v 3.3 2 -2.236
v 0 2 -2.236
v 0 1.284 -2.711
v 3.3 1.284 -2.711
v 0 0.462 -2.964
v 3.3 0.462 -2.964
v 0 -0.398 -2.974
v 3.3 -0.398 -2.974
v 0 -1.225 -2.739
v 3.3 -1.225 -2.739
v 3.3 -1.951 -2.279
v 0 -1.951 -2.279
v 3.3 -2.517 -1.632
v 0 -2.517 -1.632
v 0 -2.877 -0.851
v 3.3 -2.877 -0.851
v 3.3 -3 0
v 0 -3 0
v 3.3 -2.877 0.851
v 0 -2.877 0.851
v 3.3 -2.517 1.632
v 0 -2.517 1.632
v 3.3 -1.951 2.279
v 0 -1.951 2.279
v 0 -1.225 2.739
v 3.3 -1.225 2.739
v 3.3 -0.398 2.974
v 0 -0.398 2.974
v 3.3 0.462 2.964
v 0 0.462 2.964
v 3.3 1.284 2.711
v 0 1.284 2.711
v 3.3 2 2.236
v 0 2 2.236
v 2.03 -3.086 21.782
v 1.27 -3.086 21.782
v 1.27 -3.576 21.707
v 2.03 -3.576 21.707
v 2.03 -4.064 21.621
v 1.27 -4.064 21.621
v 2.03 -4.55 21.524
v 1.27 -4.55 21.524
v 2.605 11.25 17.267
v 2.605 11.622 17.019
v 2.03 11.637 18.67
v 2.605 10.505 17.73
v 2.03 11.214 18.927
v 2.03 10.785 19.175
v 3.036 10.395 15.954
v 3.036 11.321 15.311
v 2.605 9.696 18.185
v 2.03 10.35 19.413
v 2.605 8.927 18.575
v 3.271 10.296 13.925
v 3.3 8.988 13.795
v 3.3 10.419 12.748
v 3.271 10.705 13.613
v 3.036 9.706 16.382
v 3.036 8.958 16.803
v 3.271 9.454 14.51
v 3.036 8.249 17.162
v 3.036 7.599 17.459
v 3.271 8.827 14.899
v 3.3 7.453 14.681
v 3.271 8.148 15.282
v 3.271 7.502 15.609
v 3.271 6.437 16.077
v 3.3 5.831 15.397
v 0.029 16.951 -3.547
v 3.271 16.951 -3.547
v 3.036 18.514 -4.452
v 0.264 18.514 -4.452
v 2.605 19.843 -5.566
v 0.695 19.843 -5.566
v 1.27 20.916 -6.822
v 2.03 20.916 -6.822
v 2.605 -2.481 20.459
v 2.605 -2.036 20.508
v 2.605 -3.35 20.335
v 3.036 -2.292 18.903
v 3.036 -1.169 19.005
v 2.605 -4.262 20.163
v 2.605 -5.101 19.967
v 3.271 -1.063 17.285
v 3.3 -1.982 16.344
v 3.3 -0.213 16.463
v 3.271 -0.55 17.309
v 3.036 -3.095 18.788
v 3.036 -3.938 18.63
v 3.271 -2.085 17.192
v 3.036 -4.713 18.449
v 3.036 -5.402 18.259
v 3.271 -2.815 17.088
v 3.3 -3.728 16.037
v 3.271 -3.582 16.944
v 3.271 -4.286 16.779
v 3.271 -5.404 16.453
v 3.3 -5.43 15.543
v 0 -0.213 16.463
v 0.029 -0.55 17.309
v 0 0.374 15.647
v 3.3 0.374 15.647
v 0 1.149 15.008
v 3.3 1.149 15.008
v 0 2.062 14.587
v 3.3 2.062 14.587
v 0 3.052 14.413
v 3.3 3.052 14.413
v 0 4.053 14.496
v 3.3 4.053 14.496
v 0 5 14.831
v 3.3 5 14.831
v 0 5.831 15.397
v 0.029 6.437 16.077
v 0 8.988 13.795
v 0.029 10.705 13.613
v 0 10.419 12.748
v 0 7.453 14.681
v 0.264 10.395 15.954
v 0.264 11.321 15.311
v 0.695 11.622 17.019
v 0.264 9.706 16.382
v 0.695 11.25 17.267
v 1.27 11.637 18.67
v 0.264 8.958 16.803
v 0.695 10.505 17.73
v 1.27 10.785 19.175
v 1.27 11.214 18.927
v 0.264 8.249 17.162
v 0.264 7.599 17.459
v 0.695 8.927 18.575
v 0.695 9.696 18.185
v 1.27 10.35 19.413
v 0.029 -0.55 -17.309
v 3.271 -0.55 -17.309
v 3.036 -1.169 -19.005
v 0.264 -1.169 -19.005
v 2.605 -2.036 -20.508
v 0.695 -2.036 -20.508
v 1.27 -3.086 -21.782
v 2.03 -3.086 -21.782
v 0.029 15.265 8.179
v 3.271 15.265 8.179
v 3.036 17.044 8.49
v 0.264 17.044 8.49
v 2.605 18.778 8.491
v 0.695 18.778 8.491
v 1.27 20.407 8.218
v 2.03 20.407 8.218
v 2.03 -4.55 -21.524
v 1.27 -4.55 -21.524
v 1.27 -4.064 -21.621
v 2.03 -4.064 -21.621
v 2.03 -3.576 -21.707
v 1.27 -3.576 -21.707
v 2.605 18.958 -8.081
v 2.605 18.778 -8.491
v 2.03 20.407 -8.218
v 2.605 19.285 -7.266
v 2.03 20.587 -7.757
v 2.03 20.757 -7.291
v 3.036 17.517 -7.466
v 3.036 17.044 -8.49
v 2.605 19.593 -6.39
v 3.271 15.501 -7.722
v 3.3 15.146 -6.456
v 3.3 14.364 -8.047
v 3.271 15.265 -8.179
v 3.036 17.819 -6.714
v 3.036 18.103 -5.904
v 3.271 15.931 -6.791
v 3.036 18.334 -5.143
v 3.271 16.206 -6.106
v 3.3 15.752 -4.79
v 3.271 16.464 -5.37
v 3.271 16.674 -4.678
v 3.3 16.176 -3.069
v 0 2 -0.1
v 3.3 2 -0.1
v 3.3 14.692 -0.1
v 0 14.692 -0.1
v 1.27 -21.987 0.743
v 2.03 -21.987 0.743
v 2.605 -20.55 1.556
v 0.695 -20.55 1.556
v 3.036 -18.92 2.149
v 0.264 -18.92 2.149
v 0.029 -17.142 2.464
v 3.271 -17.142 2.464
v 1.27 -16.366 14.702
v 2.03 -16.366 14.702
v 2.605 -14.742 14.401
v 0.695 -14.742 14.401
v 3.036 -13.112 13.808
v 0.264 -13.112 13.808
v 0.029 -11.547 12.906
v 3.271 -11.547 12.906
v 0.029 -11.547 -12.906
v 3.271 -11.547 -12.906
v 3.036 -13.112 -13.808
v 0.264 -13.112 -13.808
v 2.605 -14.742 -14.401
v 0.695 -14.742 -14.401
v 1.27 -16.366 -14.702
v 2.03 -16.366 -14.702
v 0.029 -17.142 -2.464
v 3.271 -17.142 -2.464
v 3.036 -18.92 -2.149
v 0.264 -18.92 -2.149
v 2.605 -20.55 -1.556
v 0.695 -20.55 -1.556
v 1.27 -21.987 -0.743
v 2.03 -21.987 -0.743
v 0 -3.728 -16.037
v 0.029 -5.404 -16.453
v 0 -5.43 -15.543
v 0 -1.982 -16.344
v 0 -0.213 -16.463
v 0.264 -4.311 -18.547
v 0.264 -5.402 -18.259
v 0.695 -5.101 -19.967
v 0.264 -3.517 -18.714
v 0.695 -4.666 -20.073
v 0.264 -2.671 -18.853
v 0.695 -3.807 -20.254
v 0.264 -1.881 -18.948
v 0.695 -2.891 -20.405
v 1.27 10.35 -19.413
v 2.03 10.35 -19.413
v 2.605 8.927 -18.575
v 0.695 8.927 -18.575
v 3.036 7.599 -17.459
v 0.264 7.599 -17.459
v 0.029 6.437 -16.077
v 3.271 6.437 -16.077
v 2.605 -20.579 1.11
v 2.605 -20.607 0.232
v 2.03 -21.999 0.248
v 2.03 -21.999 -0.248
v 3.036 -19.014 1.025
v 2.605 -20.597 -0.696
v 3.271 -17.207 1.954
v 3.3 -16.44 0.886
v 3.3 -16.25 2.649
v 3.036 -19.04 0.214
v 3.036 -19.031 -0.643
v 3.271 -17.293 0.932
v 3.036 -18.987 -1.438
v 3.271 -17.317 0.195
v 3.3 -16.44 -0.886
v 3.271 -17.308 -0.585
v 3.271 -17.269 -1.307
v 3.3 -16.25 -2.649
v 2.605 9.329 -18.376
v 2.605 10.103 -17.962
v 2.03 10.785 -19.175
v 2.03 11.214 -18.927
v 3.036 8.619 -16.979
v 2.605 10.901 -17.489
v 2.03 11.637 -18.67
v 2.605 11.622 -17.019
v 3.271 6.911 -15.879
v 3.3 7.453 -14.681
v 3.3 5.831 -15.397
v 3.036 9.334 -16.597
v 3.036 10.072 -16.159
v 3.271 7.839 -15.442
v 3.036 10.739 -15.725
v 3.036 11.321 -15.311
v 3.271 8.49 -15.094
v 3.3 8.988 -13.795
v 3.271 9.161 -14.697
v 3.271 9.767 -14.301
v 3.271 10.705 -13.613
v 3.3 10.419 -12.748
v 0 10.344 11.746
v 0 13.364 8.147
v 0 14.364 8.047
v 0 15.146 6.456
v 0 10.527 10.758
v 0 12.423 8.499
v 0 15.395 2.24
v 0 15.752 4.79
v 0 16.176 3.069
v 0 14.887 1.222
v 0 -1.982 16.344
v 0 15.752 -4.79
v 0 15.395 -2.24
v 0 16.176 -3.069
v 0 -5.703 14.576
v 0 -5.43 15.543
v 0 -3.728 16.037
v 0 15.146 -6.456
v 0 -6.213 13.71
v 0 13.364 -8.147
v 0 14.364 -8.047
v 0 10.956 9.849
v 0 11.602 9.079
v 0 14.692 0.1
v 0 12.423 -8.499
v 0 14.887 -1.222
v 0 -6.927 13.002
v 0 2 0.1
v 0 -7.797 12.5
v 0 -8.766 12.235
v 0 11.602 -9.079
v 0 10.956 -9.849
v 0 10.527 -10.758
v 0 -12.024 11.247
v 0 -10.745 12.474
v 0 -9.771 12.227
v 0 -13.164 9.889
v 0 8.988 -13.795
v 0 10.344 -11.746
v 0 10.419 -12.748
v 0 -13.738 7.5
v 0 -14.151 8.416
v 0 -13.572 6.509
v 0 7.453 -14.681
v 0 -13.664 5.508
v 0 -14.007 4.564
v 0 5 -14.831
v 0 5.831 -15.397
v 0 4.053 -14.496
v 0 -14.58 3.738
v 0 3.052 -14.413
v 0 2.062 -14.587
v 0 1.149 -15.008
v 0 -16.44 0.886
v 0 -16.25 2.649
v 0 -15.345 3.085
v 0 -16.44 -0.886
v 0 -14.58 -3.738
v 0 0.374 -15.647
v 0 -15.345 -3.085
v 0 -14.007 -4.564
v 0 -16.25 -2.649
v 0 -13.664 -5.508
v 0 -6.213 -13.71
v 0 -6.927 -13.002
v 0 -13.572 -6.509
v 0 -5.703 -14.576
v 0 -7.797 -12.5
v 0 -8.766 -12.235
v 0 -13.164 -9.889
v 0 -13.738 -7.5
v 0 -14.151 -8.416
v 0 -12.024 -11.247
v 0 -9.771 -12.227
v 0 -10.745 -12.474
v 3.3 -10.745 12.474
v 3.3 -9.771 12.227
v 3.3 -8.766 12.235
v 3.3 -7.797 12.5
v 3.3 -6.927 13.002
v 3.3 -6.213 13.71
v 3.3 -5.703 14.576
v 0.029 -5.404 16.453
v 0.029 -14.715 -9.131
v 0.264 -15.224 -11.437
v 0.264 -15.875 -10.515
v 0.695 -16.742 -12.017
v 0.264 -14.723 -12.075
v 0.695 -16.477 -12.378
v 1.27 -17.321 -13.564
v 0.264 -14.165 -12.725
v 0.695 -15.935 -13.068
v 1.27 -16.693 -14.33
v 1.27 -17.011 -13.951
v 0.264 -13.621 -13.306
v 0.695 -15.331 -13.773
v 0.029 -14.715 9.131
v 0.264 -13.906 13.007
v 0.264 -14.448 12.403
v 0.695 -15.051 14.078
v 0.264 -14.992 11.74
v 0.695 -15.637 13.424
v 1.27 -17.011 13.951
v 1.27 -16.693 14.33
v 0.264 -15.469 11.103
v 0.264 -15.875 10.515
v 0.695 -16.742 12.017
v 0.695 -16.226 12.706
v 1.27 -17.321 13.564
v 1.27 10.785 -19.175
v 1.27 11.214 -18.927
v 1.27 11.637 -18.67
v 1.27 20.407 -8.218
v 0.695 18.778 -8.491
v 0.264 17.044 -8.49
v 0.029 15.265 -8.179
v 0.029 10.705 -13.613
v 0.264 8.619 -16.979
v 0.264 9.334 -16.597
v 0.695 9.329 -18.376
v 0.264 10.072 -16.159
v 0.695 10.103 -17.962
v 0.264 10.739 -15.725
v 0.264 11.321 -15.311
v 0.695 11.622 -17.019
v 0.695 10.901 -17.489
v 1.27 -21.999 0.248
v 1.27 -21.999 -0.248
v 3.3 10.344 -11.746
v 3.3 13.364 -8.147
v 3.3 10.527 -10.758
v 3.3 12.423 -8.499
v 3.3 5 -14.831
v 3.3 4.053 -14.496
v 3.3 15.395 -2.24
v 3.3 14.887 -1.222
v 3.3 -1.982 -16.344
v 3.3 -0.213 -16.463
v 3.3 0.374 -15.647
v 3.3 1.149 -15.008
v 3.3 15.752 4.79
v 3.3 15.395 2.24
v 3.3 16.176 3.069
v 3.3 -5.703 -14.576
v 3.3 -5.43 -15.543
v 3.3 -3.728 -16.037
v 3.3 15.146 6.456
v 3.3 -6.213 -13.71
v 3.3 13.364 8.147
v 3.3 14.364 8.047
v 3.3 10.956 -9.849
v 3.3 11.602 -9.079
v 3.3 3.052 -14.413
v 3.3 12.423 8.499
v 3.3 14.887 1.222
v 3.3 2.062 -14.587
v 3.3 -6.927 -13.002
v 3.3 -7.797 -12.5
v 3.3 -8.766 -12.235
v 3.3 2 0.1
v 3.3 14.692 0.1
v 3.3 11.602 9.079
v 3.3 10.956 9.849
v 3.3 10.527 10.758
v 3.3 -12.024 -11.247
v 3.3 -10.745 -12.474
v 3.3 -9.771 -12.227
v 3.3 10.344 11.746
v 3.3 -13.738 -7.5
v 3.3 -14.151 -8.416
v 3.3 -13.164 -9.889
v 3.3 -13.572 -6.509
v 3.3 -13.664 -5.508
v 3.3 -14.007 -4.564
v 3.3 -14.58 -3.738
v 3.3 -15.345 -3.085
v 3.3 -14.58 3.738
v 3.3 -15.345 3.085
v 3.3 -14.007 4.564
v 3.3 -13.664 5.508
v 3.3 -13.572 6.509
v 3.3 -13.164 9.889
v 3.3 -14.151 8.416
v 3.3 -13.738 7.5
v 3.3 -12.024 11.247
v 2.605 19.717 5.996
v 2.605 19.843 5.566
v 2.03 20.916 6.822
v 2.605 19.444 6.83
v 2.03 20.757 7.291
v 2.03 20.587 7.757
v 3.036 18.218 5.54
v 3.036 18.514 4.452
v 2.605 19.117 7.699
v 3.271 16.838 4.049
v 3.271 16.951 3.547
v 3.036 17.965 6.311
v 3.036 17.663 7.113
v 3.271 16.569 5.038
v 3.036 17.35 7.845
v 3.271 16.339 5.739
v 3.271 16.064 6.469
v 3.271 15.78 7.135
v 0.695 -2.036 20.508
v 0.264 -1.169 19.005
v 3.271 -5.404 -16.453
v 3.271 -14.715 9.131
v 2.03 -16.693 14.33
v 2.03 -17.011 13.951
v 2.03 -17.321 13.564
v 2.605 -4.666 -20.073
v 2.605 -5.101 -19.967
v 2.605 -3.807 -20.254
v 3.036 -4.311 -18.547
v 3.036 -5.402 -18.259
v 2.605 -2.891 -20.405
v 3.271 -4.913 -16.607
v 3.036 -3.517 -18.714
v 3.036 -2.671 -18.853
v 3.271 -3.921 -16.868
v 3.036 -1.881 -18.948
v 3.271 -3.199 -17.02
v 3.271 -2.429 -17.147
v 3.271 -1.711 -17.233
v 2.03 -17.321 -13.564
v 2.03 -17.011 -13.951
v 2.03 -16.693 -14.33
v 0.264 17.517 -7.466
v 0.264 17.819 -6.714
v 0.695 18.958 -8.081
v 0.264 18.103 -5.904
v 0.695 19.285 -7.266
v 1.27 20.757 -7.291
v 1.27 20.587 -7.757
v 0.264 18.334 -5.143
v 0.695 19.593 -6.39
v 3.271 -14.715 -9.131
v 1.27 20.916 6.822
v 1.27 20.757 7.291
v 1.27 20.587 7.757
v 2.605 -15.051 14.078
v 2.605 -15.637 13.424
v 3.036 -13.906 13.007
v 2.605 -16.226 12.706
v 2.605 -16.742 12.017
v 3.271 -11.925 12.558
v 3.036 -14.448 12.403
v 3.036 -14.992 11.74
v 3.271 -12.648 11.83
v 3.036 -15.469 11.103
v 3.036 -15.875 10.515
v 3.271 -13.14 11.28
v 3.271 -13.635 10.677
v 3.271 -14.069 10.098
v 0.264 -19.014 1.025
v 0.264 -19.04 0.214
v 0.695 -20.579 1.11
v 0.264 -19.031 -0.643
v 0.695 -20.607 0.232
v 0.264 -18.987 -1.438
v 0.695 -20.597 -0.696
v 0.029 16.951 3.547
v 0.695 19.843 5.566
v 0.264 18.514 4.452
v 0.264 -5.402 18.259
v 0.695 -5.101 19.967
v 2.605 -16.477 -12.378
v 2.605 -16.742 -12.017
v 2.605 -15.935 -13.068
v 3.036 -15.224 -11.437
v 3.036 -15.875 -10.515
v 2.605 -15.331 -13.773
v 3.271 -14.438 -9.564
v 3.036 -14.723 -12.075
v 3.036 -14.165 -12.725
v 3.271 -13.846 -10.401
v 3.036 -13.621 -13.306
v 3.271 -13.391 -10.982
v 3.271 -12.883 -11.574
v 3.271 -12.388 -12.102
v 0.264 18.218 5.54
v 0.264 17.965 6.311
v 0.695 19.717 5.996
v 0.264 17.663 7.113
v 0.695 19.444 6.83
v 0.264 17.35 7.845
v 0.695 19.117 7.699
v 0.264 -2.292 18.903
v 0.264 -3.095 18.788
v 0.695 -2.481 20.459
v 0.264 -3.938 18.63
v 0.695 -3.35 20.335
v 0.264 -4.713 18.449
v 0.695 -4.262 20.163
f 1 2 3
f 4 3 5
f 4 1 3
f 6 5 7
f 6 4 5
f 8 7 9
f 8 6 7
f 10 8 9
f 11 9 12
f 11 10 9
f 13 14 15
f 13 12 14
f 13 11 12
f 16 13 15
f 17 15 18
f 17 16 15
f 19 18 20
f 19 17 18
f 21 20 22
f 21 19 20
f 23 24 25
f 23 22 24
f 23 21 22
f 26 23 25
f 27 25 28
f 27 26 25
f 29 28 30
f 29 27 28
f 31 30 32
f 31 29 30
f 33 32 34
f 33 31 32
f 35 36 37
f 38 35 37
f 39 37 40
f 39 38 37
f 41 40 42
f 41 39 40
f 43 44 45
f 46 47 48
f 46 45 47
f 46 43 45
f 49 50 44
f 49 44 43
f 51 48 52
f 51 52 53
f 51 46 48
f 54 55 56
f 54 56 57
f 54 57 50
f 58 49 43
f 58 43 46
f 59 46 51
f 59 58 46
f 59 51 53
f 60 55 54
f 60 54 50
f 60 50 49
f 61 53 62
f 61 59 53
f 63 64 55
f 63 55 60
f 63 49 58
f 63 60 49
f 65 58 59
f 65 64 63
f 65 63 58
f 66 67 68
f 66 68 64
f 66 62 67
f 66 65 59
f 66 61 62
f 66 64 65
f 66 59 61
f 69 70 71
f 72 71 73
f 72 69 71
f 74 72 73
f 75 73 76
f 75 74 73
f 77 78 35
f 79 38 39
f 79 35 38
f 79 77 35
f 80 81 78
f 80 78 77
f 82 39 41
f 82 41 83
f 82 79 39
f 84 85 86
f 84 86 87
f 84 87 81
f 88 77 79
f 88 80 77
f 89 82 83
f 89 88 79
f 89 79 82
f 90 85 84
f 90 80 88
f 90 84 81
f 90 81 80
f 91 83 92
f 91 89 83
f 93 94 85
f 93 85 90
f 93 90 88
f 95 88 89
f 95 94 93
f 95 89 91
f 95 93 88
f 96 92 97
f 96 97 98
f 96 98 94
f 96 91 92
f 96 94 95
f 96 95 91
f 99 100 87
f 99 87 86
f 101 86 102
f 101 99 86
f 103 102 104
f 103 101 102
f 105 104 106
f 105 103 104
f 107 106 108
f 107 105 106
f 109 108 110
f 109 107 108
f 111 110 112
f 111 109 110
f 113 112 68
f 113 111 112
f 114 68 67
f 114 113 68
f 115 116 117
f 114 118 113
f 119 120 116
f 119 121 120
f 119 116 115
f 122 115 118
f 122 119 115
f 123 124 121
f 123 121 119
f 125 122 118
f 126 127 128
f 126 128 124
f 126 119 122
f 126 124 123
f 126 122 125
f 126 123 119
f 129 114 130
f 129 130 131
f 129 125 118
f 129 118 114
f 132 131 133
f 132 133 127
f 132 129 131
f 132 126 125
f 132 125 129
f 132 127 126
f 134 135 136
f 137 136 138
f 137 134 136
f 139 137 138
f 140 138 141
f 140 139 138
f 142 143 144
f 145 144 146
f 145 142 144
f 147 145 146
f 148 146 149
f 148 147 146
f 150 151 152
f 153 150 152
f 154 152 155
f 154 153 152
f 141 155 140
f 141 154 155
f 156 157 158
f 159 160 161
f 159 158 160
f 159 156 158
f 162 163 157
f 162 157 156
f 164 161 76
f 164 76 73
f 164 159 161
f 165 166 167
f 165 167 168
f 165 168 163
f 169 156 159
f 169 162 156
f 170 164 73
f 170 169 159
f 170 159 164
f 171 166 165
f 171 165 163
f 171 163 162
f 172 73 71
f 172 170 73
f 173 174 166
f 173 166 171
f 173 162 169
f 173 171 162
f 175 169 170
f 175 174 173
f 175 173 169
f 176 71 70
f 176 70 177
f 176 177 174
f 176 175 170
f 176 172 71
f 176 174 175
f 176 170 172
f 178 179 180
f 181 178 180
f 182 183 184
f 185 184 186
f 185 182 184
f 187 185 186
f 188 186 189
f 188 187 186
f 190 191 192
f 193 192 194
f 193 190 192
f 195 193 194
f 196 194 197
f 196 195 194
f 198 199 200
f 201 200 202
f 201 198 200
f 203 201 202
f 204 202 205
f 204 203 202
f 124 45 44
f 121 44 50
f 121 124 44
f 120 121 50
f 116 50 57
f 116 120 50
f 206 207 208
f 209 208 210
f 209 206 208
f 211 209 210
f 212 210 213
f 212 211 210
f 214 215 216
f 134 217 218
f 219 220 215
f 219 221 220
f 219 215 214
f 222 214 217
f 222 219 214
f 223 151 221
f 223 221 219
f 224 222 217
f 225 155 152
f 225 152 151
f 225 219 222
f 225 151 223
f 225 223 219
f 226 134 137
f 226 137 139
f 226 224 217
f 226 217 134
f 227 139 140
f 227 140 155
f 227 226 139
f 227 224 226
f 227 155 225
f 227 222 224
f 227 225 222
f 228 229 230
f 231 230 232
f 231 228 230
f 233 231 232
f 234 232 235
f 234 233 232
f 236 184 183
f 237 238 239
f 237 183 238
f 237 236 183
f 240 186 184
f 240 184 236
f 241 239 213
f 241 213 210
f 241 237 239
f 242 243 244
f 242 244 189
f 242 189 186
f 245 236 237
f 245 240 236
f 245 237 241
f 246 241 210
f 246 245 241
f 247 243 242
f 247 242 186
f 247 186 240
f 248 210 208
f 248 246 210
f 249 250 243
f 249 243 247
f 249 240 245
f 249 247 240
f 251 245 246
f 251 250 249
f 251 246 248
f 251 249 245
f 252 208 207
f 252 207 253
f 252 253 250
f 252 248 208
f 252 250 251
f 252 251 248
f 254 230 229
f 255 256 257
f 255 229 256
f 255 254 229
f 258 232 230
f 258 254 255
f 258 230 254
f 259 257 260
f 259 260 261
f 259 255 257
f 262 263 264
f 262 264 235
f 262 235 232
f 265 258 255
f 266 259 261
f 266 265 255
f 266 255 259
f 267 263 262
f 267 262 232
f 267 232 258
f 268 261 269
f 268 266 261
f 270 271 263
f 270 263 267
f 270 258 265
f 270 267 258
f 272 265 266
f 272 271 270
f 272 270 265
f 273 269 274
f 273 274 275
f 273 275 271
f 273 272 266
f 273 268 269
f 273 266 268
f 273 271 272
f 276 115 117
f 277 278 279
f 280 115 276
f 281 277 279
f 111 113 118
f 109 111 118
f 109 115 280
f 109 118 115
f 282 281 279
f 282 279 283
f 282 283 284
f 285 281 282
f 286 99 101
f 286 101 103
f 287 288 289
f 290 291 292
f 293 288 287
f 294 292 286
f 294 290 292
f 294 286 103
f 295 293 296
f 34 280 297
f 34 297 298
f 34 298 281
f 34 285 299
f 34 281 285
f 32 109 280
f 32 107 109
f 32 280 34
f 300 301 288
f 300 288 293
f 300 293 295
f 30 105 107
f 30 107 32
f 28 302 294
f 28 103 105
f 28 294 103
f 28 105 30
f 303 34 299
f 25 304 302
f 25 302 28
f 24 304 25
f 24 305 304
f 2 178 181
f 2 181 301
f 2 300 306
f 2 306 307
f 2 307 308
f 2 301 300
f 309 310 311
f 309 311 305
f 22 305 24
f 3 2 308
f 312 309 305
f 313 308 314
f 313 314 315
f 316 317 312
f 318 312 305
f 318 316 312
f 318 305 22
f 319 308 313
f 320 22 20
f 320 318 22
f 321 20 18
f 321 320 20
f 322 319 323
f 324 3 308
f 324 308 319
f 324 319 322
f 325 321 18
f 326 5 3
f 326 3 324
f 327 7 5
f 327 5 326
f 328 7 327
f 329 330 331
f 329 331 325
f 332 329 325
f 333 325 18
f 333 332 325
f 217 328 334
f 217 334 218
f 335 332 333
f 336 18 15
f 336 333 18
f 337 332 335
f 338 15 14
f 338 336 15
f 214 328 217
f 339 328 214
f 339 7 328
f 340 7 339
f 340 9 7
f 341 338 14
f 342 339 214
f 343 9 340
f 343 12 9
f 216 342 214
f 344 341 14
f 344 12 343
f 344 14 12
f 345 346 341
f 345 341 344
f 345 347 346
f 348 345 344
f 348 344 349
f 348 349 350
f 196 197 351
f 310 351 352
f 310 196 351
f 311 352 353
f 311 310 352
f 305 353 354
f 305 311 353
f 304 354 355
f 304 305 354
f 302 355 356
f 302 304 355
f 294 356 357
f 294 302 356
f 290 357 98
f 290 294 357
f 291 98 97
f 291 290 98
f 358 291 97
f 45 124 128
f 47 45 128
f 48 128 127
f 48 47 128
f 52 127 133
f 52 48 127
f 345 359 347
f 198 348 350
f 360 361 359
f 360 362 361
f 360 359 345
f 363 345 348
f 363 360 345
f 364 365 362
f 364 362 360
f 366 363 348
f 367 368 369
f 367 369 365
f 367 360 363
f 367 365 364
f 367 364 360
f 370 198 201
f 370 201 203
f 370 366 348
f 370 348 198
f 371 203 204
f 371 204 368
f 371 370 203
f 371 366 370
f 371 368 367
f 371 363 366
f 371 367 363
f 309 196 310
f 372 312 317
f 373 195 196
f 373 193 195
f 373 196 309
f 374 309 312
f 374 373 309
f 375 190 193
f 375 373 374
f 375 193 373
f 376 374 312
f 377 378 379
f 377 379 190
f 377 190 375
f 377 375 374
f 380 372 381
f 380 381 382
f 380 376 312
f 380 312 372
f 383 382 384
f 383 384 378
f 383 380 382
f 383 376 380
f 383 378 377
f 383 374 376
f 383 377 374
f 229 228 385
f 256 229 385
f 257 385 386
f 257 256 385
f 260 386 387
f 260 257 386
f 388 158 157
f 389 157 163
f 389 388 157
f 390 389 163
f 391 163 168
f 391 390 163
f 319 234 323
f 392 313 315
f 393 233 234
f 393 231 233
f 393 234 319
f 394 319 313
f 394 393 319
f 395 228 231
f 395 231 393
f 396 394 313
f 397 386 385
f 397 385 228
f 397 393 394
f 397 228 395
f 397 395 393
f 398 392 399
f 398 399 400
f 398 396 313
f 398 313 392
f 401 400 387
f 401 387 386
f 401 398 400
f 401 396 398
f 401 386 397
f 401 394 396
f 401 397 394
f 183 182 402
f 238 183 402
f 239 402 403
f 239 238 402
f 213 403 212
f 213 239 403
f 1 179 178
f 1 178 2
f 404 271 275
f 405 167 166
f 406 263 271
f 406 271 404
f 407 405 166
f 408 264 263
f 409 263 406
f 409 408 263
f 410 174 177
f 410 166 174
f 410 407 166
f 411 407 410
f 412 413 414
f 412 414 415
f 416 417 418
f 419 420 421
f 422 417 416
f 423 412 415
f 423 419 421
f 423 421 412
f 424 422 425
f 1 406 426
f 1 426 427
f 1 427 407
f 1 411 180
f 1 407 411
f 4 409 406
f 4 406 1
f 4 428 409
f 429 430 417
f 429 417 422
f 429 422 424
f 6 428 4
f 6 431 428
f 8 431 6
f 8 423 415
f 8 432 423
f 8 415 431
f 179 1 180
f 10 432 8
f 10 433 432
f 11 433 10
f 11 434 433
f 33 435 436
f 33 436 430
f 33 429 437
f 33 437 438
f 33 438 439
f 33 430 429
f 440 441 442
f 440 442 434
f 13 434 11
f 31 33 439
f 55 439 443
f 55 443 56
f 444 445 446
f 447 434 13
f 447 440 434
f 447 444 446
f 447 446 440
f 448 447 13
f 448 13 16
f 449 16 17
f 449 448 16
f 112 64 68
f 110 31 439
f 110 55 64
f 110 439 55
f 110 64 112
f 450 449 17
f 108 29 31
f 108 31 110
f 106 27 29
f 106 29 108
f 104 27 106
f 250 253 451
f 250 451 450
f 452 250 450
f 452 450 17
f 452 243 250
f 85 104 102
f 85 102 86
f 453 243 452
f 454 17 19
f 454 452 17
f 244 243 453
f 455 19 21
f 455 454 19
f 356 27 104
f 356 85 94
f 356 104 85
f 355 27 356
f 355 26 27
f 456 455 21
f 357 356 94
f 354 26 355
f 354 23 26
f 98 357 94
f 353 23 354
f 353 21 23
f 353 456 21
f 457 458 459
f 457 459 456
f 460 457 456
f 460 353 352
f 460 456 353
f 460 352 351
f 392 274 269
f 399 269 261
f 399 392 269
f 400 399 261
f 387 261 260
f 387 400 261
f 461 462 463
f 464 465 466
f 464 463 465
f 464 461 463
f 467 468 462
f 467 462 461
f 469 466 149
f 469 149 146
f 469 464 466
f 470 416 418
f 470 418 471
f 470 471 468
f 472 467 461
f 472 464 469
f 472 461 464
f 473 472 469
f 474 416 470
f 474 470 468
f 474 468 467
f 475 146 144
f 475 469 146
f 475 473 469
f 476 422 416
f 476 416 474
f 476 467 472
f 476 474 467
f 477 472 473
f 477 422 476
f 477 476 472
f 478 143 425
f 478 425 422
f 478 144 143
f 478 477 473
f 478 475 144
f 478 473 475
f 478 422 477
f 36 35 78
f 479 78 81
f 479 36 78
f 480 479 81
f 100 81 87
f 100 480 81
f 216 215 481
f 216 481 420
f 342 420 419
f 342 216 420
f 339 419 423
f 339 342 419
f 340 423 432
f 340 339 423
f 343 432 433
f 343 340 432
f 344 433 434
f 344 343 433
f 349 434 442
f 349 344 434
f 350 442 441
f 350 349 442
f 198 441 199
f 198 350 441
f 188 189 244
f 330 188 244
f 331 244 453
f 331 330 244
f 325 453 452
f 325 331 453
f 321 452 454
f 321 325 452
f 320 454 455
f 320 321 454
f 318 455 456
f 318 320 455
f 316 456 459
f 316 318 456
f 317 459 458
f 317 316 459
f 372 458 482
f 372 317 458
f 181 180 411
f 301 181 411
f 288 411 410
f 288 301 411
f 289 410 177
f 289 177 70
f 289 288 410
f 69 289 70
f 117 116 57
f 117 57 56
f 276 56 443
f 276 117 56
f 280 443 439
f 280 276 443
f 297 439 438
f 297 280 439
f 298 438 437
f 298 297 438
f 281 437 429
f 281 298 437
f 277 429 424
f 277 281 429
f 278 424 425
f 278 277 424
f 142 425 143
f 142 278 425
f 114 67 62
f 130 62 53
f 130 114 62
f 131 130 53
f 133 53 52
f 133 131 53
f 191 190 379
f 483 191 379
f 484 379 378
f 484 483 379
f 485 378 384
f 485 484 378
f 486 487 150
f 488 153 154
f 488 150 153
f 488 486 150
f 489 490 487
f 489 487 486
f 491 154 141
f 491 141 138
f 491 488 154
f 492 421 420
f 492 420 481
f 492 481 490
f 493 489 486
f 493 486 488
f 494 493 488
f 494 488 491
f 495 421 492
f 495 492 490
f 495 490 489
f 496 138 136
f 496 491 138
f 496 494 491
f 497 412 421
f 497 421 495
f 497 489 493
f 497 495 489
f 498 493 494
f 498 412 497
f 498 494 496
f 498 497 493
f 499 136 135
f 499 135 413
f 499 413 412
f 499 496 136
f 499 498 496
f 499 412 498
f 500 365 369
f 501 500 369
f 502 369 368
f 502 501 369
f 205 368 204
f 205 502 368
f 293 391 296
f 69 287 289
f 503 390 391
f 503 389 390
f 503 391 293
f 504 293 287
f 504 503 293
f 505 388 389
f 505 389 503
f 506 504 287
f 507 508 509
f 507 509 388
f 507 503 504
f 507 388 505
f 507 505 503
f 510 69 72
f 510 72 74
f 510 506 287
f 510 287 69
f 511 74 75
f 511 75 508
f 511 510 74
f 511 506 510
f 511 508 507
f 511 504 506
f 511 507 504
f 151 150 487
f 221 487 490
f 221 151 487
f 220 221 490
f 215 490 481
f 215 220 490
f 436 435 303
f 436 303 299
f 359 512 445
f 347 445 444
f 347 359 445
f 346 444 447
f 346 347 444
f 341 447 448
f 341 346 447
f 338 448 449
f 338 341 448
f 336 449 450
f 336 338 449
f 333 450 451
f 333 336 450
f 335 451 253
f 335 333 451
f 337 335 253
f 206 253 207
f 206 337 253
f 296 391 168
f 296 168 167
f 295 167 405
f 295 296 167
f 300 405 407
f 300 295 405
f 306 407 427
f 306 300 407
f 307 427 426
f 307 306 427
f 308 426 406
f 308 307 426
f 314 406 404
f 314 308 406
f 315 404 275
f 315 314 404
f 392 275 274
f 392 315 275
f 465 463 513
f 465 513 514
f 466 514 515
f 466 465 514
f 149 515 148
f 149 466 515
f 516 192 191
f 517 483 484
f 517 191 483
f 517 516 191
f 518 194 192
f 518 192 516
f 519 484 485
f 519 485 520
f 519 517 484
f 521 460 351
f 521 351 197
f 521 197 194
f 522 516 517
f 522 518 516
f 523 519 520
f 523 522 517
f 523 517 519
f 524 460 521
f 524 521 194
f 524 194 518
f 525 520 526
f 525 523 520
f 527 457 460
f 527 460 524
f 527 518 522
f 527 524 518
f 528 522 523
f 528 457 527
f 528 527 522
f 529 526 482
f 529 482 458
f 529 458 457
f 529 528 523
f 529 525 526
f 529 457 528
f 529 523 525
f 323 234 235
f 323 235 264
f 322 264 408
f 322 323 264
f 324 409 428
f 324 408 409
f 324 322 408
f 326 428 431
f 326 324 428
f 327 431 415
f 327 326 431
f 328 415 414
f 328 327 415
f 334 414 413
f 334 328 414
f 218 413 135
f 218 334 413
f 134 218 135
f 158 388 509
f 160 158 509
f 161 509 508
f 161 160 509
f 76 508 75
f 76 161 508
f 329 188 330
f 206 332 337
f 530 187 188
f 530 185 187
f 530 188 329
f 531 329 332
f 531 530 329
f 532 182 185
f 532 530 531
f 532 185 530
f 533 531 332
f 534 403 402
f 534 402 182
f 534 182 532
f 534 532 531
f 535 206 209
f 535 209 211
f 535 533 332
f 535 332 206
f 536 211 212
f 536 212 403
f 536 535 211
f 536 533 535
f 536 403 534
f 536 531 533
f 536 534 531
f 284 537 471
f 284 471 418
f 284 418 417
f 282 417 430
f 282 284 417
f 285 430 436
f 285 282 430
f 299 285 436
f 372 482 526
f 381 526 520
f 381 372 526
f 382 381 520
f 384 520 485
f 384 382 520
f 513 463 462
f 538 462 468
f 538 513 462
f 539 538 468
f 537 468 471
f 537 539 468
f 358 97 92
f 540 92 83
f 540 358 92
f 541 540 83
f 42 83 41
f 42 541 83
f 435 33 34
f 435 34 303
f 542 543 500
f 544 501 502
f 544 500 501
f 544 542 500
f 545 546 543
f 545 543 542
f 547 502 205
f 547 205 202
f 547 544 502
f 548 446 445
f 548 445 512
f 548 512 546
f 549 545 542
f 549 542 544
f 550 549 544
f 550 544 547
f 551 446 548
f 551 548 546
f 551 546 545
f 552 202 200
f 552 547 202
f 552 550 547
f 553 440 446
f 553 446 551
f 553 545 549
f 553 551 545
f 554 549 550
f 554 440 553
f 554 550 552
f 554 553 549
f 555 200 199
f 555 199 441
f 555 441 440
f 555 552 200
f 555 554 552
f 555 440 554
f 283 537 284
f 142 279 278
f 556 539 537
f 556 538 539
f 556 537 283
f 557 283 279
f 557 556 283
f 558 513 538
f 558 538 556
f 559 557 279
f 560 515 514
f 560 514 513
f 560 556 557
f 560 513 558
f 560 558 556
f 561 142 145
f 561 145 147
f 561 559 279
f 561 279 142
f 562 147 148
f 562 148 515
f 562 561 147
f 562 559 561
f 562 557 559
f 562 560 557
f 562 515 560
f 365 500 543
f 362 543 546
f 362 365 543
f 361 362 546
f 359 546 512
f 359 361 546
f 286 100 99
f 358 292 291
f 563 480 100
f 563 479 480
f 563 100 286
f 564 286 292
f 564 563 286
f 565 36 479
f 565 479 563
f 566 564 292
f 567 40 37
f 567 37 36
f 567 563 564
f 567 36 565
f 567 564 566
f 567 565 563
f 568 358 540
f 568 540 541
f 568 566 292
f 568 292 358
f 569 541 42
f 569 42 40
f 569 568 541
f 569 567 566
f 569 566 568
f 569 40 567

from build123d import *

# Parameters (mm, degrees)
CORTE_EXTRUS_O1_DEPTH = 32.287217837
PADR_OCIRCULAR2_COUNT = 9
CORTE_EXTRUS_O2_DEPTH = 32.134624111
ESBO_O7_W             = 0.2
ESBO_O7_H             = 30
CORTE_EXTRUS_O3_DEPTH = 10


with BuildPart() as part:
    # Esboço2 → Revolução1 (revolve)
    with BuildSketch(Plane.XY, mode=Mode.PRIVATE) as revolu_o1_sk:
        with BuildLine():
            Line((0, 0), (0, 16.464198342))
            ThreePointArc((0, 16.464198342), (0.321571182, 19.304004673), (1.27, 22))
            Line((1.27, 22), (2.03, 22))
            ThreePointArc((2.03, 22), (2.978428818, 19.304004673), (3.3, 16.464198342))
            Line((3.3, 16.464198342), (3.3, 0))
            Line((3.3, 0), (0, 0))
        make_face()
    revolve(revolu_o1_sk.sketch.rotate(Axis((0, 0, 0), (1, 0, 0)), 90), axis=Axis((0, 0, 0), (1, 0, 0)))

    # Esboço5 → Corte-extrusão1 (cut, through all)
    with BuildSketch(Plane(origin=(0, 0, 0), x_dir=(0, 0, -1), z_dir=(1, 0, 0))):
        with BuildLine():
            ThreePointArc((3.547062102, 16.950885739), (5.413227359, 19.685368366), (8.05493296, 21.680702805))
            ThreePointArc((8.05493296, 21.680702805), (0, 23.128657961), (-8.05493296, 21.680702805))
            ThreePointArc((-8.05493296, 21.680702805), (-5.413227359, 19.685368366), (-3.547062102, 16.950885739))
            ThreePointArc((-3.547062102, 16.950885739), (0, 14.691157961), (3.547062102, 16.950885739))
        make_face()
    corte_extrus_o1 = extrude(amount=CORTE_EXTRUS_O1_DEPTH, mode=Mode.SUBTRACT)

    # PadrãoCircular2: Corte-extrusão1 ×9 about axis
    padr_ocircular2_axis = Axis((0, 0, 0), (1, 0, 0))
    for i in range(1, PADR_OCIRCULAR2_COUNT):
        add(corte_extrus_o1.rotate(padr_ocircular2_axis, i * 360 / PADR_OCIRCULAR2_COUNT), mode=Mode.SUBTRACT)

    # Esboço6 → Corte-extrusão2 (cut, through all)
    with BuildSketch(Plane(origin=(3.3, 0, 0), x_dir=(0, 0, -1), z_dir=(1, 0, 0))):
        with BuildLine():
            Line((-2.236067977, 2), (2.236067977, 2))
            ThreePointArc((2.236067977, 2), (0, -3), (-2.236067977, 2))
        make_face()
    extrude(amount=-CORTE_EXTRUS_O2_DEPTH, mode=Mode.SUBTRACT)

    # Esboço7 → Corte-extrusão3 (cut)
    with BuildSketch(Plane(origin=(3.3, 0, 0), x_dir=(0, 0, -1), z_dir=(1, 0, 0))):
        with Locations((0, 17)):
            Rectangle(ESBO_O7_W, ESBO_O7_H)
    extrude(amount=-CORTE_EXTRUS_O3_DEPTH, mode=Mode.SUBTRACT)


solid = part.part
